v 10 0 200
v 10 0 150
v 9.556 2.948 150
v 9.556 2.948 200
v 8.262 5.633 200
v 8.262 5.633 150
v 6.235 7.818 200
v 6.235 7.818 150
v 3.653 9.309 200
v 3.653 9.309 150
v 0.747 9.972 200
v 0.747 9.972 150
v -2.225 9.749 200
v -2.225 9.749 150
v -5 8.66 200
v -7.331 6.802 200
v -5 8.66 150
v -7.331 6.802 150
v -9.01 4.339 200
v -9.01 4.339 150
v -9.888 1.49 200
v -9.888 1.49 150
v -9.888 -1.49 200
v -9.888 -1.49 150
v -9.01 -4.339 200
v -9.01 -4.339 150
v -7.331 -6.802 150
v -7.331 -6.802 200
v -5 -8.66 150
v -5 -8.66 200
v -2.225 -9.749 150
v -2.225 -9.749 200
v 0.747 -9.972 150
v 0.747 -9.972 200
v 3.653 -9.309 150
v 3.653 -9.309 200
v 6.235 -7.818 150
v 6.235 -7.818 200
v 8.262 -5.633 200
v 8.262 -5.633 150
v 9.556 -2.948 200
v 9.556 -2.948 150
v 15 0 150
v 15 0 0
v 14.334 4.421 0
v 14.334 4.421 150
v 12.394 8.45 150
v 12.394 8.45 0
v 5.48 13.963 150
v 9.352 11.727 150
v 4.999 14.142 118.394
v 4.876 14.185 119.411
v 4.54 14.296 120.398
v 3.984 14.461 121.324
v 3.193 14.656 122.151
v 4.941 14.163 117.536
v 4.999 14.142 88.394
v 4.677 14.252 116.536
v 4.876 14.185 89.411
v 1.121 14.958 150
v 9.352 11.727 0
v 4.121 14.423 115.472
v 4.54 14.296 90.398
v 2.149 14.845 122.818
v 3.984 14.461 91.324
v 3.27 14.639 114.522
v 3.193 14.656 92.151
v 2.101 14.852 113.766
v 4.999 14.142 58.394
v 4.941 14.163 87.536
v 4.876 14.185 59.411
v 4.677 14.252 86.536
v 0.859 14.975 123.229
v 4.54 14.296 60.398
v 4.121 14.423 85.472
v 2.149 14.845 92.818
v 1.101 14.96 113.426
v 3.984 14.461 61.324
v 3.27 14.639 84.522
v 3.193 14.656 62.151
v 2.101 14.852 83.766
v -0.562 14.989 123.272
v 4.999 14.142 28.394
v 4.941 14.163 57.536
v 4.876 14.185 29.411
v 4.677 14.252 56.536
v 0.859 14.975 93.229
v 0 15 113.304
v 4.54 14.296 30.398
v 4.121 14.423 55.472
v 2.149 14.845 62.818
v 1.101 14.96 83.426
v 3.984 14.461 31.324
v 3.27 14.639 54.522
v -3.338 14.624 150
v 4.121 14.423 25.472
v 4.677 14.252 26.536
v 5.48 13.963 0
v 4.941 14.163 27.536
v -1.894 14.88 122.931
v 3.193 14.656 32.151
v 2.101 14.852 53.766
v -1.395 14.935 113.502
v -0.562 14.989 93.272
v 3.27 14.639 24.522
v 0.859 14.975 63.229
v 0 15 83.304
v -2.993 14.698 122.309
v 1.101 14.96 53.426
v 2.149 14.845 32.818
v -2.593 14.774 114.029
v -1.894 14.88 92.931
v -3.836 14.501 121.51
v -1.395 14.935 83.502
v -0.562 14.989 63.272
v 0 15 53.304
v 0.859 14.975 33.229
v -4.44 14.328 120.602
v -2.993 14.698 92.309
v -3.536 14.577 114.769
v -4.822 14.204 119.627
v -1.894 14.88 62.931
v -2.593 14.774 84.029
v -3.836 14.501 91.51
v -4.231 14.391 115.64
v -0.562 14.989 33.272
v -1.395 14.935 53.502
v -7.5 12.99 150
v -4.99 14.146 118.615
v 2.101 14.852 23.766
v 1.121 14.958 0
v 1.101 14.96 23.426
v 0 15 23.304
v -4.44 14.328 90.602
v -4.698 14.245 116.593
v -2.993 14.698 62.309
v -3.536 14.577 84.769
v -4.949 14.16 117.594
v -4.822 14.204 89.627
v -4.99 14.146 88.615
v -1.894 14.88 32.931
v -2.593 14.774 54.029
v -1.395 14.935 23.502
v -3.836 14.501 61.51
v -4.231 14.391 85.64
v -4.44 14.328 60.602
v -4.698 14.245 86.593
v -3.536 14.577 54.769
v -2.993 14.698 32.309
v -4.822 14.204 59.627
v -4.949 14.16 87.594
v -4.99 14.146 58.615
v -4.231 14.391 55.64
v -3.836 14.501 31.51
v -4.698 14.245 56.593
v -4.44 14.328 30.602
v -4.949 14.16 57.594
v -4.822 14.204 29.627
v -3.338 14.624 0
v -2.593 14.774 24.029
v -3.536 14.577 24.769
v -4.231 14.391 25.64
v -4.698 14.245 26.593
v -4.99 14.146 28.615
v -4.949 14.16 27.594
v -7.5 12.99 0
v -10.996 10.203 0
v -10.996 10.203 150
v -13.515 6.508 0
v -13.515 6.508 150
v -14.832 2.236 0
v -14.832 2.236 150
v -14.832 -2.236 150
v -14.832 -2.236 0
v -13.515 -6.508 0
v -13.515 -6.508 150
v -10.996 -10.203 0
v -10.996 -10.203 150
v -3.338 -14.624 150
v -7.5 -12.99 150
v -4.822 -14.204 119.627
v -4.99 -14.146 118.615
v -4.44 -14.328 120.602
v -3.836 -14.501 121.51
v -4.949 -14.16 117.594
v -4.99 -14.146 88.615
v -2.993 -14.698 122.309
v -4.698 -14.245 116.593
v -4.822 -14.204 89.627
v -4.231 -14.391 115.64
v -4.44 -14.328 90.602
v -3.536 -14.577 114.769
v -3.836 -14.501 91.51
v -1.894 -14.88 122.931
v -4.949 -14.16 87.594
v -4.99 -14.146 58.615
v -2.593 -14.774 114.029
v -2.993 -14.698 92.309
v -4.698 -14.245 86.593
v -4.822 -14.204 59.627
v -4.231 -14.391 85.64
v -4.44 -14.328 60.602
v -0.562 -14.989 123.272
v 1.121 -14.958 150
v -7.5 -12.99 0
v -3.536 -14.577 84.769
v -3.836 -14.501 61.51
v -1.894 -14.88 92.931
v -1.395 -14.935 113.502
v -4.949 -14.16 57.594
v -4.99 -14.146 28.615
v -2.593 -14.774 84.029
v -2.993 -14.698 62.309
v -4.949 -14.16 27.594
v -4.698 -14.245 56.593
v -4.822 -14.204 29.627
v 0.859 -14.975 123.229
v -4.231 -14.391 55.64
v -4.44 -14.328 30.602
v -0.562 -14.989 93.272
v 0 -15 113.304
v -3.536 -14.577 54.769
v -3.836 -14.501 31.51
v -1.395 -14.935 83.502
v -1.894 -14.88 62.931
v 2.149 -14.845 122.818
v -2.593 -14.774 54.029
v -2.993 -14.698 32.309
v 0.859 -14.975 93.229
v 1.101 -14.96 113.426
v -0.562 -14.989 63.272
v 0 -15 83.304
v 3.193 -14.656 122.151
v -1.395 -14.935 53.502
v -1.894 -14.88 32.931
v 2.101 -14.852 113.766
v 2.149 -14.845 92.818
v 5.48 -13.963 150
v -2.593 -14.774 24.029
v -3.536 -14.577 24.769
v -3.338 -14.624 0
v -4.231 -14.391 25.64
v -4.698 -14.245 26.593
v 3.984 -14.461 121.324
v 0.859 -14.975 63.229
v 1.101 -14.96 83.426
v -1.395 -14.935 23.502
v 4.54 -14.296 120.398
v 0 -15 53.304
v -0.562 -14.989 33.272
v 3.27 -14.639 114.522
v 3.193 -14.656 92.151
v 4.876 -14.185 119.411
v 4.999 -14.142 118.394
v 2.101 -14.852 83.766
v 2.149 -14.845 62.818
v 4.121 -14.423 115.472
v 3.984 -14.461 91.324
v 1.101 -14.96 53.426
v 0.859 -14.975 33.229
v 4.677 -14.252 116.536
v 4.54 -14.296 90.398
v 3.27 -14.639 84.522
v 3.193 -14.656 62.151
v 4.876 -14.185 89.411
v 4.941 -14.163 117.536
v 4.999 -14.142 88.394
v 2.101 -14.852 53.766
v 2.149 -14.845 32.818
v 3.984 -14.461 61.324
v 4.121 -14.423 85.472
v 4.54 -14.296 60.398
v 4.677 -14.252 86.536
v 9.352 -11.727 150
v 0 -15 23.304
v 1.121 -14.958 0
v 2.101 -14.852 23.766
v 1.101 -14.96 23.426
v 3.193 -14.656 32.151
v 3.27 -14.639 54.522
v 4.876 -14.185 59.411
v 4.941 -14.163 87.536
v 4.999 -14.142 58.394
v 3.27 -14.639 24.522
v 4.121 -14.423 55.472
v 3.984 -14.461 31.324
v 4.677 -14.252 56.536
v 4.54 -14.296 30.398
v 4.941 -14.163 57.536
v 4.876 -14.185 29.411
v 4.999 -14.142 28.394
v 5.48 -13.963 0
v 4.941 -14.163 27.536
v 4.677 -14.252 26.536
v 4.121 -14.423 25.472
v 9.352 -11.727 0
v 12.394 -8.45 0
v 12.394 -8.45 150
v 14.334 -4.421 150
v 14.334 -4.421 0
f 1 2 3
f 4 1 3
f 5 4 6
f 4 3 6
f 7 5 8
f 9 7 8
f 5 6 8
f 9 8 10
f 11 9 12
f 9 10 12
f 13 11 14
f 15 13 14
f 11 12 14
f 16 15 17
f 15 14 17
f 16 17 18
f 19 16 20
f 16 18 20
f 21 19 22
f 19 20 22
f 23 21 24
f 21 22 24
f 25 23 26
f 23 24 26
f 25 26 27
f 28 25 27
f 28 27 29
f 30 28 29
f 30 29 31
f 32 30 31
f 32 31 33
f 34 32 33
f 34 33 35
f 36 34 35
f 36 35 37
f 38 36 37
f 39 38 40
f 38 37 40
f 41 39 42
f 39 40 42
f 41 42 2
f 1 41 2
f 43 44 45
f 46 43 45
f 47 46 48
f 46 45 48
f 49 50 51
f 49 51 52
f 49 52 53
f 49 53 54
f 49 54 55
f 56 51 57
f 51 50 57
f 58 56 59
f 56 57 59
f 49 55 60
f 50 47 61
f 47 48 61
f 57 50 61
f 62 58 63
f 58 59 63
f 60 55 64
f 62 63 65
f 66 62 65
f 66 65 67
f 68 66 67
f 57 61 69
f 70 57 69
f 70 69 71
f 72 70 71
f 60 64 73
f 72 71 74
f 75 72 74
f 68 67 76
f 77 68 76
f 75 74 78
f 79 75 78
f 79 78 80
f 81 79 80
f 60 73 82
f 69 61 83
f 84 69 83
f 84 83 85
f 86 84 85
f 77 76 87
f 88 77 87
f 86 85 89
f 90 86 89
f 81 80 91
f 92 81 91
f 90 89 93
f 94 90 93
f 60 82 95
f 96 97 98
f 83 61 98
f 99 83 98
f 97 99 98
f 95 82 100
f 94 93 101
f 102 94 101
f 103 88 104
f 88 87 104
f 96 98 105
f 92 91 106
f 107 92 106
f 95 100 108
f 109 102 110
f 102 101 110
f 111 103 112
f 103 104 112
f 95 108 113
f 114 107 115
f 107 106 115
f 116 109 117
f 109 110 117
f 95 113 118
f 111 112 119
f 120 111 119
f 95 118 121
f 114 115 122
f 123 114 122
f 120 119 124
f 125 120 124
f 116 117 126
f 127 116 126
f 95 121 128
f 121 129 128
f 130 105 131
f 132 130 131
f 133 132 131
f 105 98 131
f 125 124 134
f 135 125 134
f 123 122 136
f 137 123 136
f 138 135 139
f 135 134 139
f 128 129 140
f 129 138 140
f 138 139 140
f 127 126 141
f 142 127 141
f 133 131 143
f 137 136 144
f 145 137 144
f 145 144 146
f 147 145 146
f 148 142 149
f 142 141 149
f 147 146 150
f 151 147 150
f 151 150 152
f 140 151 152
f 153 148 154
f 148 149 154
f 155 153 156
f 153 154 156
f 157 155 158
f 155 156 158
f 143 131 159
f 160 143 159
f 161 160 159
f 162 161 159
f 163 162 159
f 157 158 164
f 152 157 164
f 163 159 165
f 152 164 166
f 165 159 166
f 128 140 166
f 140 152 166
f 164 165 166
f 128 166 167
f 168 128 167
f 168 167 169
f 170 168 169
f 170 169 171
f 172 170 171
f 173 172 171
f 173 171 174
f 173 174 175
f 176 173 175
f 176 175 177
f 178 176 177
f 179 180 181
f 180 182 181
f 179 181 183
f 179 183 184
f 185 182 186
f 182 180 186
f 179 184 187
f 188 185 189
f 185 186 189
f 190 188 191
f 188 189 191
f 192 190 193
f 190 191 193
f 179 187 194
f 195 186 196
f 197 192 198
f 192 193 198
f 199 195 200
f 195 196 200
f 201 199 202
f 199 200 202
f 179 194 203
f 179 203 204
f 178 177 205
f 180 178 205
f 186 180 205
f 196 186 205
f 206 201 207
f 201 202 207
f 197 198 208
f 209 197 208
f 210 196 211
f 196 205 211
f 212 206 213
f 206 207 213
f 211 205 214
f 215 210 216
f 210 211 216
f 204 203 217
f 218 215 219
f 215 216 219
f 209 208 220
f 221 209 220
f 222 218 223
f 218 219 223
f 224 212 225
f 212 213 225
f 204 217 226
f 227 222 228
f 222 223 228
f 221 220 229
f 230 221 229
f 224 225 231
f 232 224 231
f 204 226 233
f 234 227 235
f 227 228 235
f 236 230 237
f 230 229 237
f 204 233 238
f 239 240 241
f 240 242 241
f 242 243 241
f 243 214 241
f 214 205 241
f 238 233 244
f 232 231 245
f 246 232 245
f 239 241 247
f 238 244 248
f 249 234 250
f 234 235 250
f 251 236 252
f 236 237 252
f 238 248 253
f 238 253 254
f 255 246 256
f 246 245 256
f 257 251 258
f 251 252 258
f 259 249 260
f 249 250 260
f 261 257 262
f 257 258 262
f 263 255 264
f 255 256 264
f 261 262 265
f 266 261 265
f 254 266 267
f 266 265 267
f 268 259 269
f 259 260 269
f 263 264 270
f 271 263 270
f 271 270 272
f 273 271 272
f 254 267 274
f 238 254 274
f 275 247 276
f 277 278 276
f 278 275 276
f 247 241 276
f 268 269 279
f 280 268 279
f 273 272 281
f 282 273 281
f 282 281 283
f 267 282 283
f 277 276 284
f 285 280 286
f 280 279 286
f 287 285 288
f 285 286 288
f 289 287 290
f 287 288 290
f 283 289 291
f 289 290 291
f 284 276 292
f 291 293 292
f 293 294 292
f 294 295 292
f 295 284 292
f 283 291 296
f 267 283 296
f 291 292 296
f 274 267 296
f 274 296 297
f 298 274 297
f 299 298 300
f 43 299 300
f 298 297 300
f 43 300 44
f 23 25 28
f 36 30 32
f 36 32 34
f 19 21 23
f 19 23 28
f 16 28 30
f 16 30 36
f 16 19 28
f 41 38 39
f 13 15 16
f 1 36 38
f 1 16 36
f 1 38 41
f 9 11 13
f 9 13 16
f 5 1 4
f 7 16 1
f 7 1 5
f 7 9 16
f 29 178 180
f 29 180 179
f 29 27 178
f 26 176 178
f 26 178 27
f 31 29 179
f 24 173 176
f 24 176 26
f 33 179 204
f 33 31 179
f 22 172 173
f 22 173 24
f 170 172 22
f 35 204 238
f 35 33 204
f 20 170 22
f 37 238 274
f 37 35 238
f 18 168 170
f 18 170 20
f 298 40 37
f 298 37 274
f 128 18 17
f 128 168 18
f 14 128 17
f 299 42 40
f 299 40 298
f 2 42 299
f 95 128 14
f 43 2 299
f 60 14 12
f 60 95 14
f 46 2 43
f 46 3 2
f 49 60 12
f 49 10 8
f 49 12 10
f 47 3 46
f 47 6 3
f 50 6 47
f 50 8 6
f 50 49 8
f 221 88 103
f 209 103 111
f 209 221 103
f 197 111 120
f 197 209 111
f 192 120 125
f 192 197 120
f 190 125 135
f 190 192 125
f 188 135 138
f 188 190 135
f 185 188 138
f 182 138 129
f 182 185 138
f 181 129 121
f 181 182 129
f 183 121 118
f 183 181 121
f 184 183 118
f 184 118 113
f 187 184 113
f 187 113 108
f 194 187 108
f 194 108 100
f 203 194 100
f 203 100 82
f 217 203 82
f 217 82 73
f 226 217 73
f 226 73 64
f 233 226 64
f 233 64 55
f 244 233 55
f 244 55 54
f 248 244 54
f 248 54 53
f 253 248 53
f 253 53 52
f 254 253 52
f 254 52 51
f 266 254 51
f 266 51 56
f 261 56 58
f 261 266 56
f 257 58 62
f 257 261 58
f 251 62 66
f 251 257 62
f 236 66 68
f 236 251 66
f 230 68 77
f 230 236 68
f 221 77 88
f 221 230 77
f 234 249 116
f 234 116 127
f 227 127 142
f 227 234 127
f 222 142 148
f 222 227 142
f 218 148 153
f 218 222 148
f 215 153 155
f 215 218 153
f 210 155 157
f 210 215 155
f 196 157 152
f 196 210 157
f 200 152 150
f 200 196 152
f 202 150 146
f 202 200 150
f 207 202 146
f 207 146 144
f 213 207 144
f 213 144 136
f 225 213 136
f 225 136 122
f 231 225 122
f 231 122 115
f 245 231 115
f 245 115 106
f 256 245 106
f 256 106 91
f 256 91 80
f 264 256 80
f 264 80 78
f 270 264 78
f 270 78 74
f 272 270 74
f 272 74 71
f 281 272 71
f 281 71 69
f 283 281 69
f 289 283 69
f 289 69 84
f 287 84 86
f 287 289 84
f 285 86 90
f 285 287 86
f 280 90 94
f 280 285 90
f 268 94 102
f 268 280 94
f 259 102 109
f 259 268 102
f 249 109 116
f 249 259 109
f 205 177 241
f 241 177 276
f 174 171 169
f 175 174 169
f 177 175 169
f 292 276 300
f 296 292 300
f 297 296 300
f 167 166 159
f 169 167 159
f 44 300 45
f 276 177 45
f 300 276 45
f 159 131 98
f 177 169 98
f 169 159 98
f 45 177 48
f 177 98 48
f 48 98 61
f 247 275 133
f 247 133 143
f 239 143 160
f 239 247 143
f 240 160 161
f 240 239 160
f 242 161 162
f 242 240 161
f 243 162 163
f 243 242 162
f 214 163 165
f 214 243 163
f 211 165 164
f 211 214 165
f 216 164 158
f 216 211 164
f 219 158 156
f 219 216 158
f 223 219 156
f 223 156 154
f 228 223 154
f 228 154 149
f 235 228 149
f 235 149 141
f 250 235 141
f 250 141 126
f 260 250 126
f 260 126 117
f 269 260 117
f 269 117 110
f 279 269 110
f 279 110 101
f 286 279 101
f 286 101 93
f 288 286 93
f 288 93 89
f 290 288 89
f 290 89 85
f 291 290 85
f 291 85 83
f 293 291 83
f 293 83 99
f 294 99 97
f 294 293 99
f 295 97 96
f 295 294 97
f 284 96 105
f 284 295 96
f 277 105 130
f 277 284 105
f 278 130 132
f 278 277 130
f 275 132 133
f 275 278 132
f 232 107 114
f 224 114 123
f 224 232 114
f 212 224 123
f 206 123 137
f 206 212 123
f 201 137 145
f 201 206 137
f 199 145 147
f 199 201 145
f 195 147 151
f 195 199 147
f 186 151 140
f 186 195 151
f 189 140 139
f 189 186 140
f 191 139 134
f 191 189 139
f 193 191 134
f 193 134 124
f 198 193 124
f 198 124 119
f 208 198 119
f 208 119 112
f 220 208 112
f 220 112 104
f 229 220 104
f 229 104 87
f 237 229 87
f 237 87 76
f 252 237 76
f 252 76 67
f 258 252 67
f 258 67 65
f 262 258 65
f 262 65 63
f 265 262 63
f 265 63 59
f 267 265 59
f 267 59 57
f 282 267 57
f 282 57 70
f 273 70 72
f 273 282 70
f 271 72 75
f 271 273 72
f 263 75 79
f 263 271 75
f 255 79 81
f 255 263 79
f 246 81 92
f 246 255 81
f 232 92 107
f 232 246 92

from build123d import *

# Parameters (mm, degrees)
SZKIC1_R                        = 15
DODANIE_WYCI_GNI_CIE1_DEPTH     = 150
SZKIC2_R                        = 10
DODANIE_WYCI_GNI_CIE2_DEPTH     = 50
WYTNIJ_WYCI_GNI_CIE1_DEPTH      = 70
WYTNIJ_WYCI_GNI_CIE1_DEPTH_BACK = 70
SZKIC3_R                        = 5


with BuildPart() as part:
    # Szkic1 → Dodanie-wyciągnięcie1 (new body)
    with BuildSketch(Plane.XY):
        Circle(SZKIC1_R)
    extrude(amount=DODANIE_WYCI_GNI_CIE1_DEPTH)

    # Szkic2 → Dodanie-wyciągnięcie2 (add)
    with BuildSketch(Plane.XY.offset(150)):
        Circle(SZKIC2_R)
    extrude(amount=DODANIE_WYCI_GNI_CIE2_DEPTH)

    # Szkic3 → Wytnij-wyciągnięcie1 (cut, two sides: drawn at the far end of the back side and taken through both)
    with BuildSketch(Plane(origin=(0, 0, 0), x_dir=(1, 0, 0), z_dir=(0, 1, 0)).offset(-WYTNIJ_WYCI_GNI_CIE1_DEPTH_BACK)):
        with Locations((0, -28.303646962)):
            Circle(SZKIC3_R)
        with Locations((0, -58.303646962)):
            Circle(SZKIC3_R)
        with Locations((0, -88.303646962)):
            Circle(SZKIC3_R)
        with Locations((0, -118.303646962)):
            Circle(SZKIC3_R)
    extrude(amount=WYTNIJ_WYCI_GNI_CIE1_DEPTH + WYTNIJ_WYCI_GNI_CIE1_DEPTH_BACK, mode=Mode.SUBTRACT)


solid = part.part
